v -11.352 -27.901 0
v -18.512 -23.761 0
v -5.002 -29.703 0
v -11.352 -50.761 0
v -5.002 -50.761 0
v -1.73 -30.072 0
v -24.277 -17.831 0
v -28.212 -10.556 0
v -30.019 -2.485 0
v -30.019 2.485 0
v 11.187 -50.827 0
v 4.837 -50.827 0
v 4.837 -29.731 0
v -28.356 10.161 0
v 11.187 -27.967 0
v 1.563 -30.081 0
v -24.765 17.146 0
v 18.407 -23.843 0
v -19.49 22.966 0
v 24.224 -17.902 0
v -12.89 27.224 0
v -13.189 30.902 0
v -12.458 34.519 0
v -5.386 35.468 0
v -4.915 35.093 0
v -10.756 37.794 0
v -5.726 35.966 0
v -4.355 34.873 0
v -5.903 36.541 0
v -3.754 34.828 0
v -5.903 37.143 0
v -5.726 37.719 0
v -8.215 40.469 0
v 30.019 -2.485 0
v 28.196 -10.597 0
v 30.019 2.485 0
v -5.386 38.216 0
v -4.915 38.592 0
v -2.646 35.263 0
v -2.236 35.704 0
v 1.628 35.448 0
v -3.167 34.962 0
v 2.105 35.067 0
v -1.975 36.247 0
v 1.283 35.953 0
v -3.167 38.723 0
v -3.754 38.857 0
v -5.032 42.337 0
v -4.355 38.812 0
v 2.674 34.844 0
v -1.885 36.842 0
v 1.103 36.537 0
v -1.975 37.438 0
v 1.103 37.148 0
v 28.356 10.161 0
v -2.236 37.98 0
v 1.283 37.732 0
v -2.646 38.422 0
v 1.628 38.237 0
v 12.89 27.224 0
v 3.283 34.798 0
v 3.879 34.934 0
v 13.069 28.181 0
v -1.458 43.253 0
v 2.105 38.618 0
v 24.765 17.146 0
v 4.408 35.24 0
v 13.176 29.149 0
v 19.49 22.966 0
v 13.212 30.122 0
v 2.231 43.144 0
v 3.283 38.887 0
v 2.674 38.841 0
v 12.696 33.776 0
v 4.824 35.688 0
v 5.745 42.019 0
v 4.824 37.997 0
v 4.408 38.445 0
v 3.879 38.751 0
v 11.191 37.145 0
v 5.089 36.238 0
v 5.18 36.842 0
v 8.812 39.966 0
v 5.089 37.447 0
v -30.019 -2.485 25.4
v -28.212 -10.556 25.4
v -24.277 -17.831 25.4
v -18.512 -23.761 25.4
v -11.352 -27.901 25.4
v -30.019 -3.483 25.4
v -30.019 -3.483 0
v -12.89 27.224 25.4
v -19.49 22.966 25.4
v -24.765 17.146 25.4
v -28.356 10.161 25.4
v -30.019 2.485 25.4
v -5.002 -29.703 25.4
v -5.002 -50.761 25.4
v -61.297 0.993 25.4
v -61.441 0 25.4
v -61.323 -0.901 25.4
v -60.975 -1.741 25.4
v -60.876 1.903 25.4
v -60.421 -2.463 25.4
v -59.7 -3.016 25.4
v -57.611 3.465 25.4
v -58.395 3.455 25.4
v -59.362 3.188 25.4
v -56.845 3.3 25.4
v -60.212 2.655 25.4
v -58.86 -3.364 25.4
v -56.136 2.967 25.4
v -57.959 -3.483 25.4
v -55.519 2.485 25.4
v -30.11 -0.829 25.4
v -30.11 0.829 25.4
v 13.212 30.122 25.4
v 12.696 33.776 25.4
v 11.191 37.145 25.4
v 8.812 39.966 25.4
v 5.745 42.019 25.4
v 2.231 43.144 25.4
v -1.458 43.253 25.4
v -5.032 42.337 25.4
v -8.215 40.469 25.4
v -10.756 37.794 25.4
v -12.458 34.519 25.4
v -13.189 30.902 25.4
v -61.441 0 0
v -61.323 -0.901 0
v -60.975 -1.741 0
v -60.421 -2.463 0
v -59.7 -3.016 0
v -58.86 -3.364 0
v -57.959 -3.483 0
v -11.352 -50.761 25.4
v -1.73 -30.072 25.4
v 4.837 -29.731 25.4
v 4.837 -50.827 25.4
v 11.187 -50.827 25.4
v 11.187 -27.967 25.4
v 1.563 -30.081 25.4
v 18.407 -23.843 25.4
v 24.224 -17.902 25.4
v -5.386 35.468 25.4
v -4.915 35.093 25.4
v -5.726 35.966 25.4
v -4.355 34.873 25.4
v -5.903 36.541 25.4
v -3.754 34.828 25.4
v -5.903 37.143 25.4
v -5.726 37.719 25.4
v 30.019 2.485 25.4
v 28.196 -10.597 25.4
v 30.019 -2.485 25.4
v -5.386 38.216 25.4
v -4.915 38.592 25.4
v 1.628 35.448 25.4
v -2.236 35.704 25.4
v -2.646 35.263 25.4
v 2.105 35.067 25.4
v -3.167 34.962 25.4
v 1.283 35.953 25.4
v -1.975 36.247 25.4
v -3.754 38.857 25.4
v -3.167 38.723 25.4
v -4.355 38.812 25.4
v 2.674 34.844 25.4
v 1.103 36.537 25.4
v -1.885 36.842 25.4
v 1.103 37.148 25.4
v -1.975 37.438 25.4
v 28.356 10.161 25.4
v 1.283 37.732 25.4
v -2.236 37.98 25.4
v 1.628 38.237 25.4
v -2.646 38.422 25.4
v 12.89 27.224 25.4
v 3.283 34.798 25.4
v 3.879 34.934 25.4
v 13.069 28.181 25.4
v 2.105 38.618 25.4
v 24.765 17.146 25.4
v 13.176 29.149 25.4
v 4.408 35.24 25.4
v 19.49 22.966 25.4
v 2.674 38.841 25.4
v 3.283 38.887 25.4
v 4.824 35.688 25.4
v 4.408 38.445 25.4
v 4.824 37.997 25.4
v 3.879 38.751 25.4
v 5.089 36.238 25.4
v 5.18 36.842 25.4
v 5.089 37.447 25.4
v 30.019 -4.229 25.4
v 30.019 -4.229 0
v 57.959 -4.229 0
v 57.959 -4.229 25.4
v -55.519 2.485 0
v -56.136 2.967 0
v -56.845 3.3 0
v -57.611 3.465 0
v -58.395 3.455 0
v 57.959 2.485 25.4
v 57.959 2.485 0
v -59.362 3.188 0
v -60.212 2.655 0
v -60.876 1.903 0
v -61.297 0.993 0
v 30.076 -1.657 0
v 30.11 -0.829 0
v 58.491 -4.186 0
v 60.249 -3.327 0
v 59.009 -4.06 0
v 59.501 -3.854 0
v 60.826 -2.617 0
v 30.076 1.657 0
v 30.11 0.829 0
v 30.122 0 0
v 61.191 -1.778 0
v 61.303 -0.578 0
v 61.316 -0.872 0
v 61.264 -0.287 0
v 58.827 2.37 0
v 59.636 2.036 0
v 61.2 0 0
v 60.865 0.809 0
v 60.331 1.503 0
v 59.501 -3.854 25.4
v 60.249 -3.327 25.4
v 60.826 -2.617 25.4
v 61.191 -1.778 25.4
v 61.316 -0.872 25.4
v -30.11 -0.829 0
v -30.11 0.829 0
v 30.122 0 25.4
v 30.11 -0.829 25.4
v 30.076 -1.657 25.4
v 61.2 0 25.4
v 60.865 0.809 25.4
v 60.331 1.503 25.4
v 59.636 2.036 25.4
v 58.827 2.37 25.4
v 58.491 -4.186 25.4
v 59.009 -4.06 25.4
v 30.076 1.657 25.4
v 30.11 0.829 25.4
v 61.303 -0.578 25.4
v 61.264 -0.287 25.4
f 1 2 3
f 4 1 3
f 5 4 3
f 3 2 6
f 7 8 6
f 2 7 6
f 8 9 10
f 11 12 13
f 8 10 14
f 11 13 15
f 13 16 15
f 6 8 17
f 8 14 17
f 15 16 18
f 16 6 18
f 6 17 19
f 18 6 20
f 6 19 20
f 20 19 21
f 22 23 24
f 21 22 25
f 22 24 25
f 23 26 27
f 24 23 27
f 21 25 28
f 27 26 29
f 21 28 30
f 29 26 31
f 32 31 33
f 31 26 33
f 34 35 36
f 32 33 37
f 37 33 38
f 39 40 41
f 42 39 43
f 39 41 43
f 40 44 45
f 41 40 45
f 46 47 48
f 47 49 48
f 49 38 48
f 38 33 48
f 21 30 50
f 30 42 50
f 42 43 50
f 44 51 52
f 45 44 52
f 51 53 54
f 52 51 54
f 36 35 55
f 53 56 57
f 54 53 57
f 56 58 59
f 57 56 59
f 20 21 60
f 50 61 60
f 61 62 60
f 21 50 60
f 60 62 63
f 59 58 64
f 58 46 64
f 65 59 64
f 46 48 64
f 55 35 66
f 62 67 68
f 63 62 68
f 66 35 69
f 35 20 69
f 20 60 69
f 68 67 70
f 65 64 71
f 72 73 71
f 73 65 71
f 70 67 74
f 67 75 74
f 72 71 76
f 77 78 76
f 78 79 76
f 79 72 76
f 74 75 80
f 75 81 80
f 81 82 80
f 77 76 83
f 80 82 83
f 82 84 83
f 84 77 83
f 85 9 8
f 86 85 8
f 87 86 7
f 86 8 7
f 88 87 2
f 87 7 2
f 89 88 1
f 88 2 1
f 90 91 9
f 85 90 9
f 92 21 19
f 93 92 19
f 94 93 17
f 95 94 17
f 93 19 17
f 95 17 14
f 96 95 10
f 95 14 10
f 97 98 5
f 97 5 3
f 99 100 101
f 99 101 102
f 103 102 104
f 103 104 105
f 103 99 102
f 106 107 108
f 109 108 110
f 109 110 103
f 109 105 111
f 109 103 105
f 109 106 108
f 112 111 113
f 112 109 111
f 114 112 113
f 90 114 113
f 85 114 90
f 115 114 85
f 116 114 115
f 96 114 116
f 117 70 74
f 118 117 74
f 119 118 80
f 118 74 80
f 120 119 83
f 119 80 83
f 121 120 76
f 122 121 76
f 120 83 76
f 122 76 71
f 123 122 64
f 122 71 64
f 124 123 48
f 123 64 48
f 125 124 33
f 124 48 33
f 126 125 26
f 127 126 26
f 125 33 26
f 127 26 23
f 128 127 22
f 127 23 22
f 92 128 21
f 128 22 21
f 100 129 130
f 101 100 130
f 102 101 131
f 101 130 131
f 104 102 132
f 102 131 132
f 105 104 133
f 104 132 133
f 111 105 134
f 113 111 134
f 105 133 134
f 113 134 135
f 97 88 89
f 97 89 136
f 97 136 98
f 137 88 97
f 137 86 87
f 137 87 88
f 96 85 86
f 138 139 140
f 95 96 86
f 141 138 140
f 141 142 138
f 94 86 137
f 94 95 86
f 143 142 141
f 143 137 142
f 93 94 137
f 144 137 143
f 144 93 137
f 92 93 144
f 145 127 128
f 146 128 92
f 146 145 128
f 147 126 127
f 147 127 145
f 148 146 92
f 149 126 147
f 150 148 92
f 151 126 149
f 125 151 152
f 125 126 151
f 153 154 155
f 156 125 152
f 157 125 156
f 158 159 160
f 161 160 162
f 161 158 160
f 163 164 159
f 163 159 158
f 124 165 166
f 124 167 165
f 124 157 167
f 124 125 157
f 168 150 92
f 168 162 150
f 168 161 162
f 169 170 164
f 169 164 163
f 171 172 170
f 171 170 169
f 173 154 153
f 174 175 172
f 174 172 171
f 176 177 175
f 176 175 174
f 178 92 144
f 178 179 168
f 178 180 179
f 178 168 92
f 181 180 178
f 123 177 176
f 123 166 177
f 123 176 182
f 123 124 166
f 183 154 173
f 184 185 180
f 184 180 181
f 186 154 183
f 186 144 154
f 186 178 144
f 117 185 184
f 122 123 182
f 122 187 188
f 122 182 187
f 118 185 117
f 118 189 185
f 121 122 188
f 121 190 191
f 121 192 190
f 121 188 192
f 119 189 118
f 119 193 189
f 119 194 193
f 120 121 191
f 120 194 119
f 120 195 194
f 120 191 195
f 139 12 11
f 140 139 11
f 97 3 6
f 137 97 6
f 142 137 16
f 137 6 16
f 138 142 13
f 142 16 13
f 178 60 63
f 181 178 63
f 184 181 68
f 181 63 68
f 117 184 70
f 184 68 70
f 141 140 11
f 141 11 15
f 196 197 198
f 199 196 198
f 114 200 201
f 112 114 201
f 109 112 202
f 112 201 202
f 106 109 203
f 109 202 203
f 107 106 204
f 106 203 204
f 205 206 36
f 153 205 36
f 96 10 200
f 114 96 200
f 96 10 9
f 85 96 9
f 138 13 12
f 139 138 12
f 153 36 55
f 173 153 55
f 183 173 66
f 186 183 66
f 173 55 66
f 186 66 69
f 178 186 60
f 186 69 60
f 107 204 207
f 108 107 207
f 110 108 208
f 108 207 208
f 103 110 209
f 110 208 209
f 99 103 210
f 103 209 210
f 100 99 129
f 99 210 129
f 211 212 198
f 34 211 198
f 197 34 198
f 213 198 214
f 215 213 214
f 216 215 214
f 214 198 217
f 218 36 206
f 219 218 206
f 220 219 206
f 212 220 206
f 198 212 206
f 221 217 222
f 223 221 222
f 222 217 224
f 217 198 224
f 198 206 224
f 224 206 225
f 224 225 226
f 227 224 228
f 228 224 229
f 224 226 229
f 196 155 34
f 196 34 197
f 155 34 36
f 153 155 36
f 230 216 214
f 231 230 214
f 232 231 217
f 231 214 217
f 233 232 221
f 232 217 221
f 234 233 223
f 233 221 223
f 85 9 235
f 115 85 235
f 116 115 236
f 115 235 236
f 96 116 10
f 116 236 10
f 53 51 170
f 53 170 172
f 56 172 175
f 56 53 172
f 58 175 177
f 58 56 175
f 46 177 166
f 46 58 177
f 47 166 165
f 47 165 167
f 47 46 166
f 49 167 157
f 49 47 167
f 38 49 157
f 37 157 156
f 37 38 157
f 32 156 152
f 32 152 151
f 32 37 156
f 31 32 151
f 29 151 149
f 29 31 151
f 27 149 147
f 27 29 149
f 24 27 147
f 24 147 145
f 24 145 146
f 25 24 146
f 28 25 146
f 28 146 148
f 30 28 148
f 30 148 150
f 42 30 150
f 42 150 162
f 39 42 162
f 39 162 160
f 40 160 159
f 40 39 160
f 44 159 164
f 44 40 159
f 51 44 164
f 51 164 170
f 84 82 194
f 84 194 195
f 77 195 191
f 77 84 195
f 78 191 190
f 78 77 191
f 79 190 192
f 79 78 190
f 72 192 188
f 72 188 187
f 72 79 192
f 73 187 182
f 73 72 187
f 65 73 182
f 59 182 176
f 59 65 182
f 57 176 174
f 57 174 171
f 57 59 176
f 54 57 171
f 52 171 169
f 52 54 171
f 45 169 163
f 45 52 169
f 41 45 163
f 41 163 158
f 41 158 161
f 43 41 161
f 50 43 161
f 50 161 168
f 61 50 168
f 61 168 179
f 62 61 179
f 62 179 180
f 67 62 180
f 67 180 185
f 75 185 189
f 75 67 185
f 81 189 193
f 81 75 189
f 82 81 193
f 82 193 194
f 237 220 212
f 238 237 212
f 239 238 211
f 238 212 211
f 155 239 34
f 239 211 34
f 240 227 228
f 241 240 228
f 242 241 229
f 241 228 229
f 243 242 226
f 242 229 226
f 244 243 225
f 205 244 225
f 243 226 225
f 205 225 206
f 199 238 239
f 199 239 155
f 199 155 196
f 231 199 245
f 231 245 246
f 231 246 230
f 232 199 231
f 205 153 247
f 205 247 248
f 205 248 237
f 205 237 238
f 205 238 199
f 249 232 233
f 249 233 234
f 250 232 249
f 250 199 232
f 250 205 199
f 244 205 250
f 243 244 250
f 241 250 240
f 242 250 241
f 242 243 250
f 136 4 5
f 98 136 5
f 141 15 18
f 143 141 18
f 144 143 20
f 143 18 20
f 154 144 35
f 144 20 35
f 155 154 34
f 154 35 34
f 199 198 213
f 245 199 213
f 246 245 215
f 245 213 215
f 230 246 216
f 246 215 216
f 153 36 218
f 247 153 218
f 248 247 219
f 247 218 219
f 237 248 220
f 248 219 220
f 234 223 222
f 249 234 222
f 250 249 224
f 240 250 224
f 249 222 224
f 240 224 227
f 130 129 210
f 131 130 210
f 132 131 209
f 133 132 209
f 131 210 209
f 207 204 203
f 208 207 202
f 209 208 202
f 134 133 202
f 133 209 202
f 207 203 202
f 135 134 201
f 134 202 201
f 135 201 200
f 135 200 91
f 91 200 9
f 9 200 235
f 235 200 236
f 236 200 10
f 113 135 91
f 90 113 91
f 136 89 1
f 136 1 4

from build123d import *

# Parameters (mm, degrees)
F0_R     = 2.0202110332
F0_R_2   = 2.0499950134
F1_DEPTH = 25.4


with BuildPart() as f1:
    # F0 (on Top) → F1 (new body)
    with BuildSketch(Plane.XY):
        with BuildLine():
            Line((30.018958472, -2.4845898661), (30.018958472, 2.4845898661))
            ThreePointArc((30.018958472, 2.4845898661), (24.7651066101, 17.1464442126), (12.8902128264, 27.2241339226))
            ThreePointArc((12.8902128264, 27.2241339226), (0, 16.9097566534), (-12.8902128264, 27.2241339226))
            ThreePointArc((-12.8902128264, 27.2241339226), (-24.7651066101, 17.1464442126), (-30.018958472, 2.4845898661))
            Line((-30.018958472, 2.4845898661), (-30.018958472, -2.4845898661))
            ThreePointArc((-30.018958472, -2.4845898661), (-24.2771660117, -17.8305991202), (-11.3518982056, -27.9006355067))
            Line((-11.3518982056, -27.9006355067), (-5.0018982056, -27.9006355067))
            Line((-5.0018982056, -27.9006355067), (-5.0018982056, -29.7034016383))
            ThreePointArc((-5.0018982056, -29.7034016383), (-0.0836139515, -30.121488397), (4.836915615, -29.7307131075))
            Line((4.836915615, -29.7307131075), (4.836915615, -27.967194596))
            Line((4.836915615, -27.967194596), (11.186915615, -27.967194596))
            ThreePointArc((11.186915615, -27.967194596), (24.2244050654, -17.9022136556), (30.018958472, -2.4845898661))
        make_face()
        with BuildLine():
            ThreePointArc((5.6925358826, 29.5788115003), (9.3656694379, 28.6285747205), (12.8902128264, 27.2241339226))
            ThreePointArc((12.8902128264, 27.2241339226), (13.1311928641, 28.6639707066), (13.211847795, 30.1216044484))
            ThreePointArc((13.211847795, 30.1216044484), (-1.4576337418, 43.2527973125), (-12.8902128264, 27.2241339226))
            ThreePointArc((-12.8902128264, 27.2241339226), (-9.6523661982, 28.5331891194), (-6.2847596858, 29.4586634157))
            ThreePointArc((-6.2847596858, 29.4586634157), (-0.3021442517, 30.1200890337), (5.6925358826, 29.5788115003))
        make_face()
        with Locations((-3.9053533692, 36.8423350155)):
            Circle(F0_R, mode=Mode.SUBTRACT)
        with Locations((3.1302943826, 36.8423350155)):
            Circle(F0_R_2, mode=Mode.SUBTRACT)
        with BuildLine():
            ThreePointArc((-12.8902128264, 27.2241339226), (0, 16.9097566534), (12.8902128264, 27.2241339226))
            ThreePointArc((12.8902128264, 27.2241339226), (9.3656694379, 28.6285747205), (5.6925358826, 29.5788115003))
            ThreePointArc((5.6925358826, 29.5788115003), (-0.2317973528, 23.107363008), (-6.2847596858, 29.4586634157))
            ThreePointArc((-6.2847596858, 29.4586634157), (-9.6523661982, 28.5331891194), (-12.8902128264, 27.2241339226))
        make_face()
        with BuildLine():
            ThreePointArc((-6.2847596858, 29.4586634157), (-0.2317973528, 23.107363008), (5.6925358826, 29.5788115003))
            ThreePointArc((5.6925358826, 29.5788115003), (-0.3021442517, 30.1200890337), (-6.2847596858, 29.4586634157))
        make_face()
        with BuildLine():
            Line((-5.0018982056, -50.7606355067), (-5.0018982056, -29.7034016383))
            ThreePointArc((-5.0018982056, -29.7034016383), (-8.2264303131, -28.9764887253), (-11.3518982056, -27.9006355067))
            Line((-11.3518982056, -27.9006355067), (-11.3518982056, -50.7606355067))
            Line((-11.3518982056, -50.7606355067), (-5.0018982056, -50.7606355067))
        make_face()
        with BuildLine():
            Line((11.186915615, -50.827194596), (11.186915615, -27.967194596))
            ThreePointArc((11.186915615, -27.967194596), (8.0602910126, -29.0231418585), (4.836915615, -29.7307131075))
            Line((4.836915615, -29.7307131075), (4.836915615, -50.827194596))
            Line((4.836915615, -50.827194596), (11.186915615, -50.827194596))
        make_face()
        with BuildLine():
            ThreePointArc((4.836915615, -29.7307131075), (8.0602910126, -29.0231418585), (11.186915615, -27.967194596))
            Line((11.186915615, -27.967194596), (4.836915615, -27.967194596))
            Line((4.836915615, -27.967194596), (4.836915615, -29.7307131075))
        make_face()
        with BuildLine():
            ThreePointArc((-11.3518982056, -27.9006355067), (-8.2264303131, -28.9764887253), (-5.0018982056, -29.7034016383))
            Line((-5.0018982056, -29.7034016383), (-5.0018982056, -27.9006355067))
            Line((-5.0018982056, -27.9006355067), (-11.3518982056, -27.9006355067))
        make_face()
    extrude(amount=F1_DEPTH)


with BuildPart() as f1b:
    # F0 (on Top) → F1, piece 2 (new body)
    with BuildSketch(Plane.XY):
        with BuildLine():
            ThreePointArc((30.018958472, 2.4845898661), (30.0959320141, 1.2433546356), (30.1216044484, 0))
            ThreePointArc((30.1216044484, 0), (30.0959320141, -1.2433546356), (30.018958472, -2.4845898661))
            Line((30.018958472, -2.4845898661), (30.018958472, -4.2287655294))
            Line((30.018958472, -4.2287655294), (57.958958472, -4.2287655294))
            ThreePointArc((57.958958472, -4.2287655294), (54.6022807742, -0.8720878317), (57.958958472, 2.4845898661))
            Line((57.958958472, 2.4845898661), (30.018958472, 2.4845898661))
        make_face()
        with BuildLine():
            Line((57.958958472, -4.2287655294), (57.958958472, 2.4845898661))
            ThreePointArc((57.958958472, 2.4845898661), (54.6022807742, -0.8720878317), (57.958958472, -4.2287655294))
        make_face()
        with BuildLine():
            ThreePointArc((61.20036989, 0), (60.0010122656, 1.7919882691), (57.958958472, 2.4845898661))
            Line((57.958958472, 2.4845898661), (57.958958472, -4.2287655294))
            ThreePointArc((57.958958472, -4.2287655294), (58.7523715697, -4.1336489338), (59.5008195205, -3.8536896954))
            ThreePointArc((59.5008195205, -3.8536896954), (60.8262582262, -2.6173320226), (61.3156361698, -0.8720878317))
            ThreePointArc((61.3156361698, -0.8720878317), (61.2866948334, -0.4322516402), (61.20036989, 0))
        make_face()
    extrude(amount=F1_DEPTH)


with BuildPart() as f1c:
    # F0 (on Top) → F1, piece 3 (new body)
    with BuildSketch(Plane.XY):
        with BuildLine():
            ThreePointArc((-30.018958472, -2.4845898661), (-30.1216044484, 0), (-30.018958472, 2.4845898661))
            Line((-30.018958472, 2.4845898661), (-55.518731556, 2.4845898661))
            ThreePointArc((-55.518731556, 2.4845898661), (-54.7475712909, 1.3471772627), (-54.476445844, 0))
            ThreePointArc((-54.476445844, 0), (-55.4964501772, -2.4625082948), (-57.958958472, -3.482512628))
            Line((-57.958958472, -3.482512628), (-30.018958472, -3.482512628))
            Line((-30.018958472, -3.482512628), (-30.018958472, -2.4845898661))
        make_face()
        with BuildLine():
            Line((-57.958958472, -3.482512628), (-57.958958472, 2.4845898661))
            Line((-57.958958472, 2.4845898661), (-58.3947922396, 3.4551328674))
            ThreePointArc((-58.3947922396, 3.4551328674), (-60.5710161669, 2.3032691554), (-61.4414711, 0))
            ThreePointArc((-61.4414711, 0), (-60.4214667668, -2.4625082948), (-57.958958472, -3.482512628))
        make_face()
        with BuildLine():
            ThreePointArc((-54.476445844, 0), (-54.7475712909, 1.3471772627), (-55.518731556, 2.4845898661))
            Line((-55.518731556, 2.4845898661), (-57.958958472, 2.4845898661))
            Line((-57.958958472, 2.4845898661), (-57.958958472, -3.482512628))
            ThreePointArc((-57.958958472, -3.482512628), (-55.4964501772, -2.4625082948), (-54.476445844, 0))
        make_face()
        with BuildLine():
            Line((-57.958958472, 2.4845898661), (-55.518731556, 2.4845898661))
            ThreePointArc((-55.518731556, 2.4845898661), (-56.8454566073, 3.2996981379), (-58.3947922396, 3.4551328674))
            Line((-58.3947922396, 3.4551328674), (-57.958958472, 2.4845898661))
        make_face()
    extrude(amount=F1_DEPTH)


solid = Compound([f1.part, f1b.part, f1c.part])
